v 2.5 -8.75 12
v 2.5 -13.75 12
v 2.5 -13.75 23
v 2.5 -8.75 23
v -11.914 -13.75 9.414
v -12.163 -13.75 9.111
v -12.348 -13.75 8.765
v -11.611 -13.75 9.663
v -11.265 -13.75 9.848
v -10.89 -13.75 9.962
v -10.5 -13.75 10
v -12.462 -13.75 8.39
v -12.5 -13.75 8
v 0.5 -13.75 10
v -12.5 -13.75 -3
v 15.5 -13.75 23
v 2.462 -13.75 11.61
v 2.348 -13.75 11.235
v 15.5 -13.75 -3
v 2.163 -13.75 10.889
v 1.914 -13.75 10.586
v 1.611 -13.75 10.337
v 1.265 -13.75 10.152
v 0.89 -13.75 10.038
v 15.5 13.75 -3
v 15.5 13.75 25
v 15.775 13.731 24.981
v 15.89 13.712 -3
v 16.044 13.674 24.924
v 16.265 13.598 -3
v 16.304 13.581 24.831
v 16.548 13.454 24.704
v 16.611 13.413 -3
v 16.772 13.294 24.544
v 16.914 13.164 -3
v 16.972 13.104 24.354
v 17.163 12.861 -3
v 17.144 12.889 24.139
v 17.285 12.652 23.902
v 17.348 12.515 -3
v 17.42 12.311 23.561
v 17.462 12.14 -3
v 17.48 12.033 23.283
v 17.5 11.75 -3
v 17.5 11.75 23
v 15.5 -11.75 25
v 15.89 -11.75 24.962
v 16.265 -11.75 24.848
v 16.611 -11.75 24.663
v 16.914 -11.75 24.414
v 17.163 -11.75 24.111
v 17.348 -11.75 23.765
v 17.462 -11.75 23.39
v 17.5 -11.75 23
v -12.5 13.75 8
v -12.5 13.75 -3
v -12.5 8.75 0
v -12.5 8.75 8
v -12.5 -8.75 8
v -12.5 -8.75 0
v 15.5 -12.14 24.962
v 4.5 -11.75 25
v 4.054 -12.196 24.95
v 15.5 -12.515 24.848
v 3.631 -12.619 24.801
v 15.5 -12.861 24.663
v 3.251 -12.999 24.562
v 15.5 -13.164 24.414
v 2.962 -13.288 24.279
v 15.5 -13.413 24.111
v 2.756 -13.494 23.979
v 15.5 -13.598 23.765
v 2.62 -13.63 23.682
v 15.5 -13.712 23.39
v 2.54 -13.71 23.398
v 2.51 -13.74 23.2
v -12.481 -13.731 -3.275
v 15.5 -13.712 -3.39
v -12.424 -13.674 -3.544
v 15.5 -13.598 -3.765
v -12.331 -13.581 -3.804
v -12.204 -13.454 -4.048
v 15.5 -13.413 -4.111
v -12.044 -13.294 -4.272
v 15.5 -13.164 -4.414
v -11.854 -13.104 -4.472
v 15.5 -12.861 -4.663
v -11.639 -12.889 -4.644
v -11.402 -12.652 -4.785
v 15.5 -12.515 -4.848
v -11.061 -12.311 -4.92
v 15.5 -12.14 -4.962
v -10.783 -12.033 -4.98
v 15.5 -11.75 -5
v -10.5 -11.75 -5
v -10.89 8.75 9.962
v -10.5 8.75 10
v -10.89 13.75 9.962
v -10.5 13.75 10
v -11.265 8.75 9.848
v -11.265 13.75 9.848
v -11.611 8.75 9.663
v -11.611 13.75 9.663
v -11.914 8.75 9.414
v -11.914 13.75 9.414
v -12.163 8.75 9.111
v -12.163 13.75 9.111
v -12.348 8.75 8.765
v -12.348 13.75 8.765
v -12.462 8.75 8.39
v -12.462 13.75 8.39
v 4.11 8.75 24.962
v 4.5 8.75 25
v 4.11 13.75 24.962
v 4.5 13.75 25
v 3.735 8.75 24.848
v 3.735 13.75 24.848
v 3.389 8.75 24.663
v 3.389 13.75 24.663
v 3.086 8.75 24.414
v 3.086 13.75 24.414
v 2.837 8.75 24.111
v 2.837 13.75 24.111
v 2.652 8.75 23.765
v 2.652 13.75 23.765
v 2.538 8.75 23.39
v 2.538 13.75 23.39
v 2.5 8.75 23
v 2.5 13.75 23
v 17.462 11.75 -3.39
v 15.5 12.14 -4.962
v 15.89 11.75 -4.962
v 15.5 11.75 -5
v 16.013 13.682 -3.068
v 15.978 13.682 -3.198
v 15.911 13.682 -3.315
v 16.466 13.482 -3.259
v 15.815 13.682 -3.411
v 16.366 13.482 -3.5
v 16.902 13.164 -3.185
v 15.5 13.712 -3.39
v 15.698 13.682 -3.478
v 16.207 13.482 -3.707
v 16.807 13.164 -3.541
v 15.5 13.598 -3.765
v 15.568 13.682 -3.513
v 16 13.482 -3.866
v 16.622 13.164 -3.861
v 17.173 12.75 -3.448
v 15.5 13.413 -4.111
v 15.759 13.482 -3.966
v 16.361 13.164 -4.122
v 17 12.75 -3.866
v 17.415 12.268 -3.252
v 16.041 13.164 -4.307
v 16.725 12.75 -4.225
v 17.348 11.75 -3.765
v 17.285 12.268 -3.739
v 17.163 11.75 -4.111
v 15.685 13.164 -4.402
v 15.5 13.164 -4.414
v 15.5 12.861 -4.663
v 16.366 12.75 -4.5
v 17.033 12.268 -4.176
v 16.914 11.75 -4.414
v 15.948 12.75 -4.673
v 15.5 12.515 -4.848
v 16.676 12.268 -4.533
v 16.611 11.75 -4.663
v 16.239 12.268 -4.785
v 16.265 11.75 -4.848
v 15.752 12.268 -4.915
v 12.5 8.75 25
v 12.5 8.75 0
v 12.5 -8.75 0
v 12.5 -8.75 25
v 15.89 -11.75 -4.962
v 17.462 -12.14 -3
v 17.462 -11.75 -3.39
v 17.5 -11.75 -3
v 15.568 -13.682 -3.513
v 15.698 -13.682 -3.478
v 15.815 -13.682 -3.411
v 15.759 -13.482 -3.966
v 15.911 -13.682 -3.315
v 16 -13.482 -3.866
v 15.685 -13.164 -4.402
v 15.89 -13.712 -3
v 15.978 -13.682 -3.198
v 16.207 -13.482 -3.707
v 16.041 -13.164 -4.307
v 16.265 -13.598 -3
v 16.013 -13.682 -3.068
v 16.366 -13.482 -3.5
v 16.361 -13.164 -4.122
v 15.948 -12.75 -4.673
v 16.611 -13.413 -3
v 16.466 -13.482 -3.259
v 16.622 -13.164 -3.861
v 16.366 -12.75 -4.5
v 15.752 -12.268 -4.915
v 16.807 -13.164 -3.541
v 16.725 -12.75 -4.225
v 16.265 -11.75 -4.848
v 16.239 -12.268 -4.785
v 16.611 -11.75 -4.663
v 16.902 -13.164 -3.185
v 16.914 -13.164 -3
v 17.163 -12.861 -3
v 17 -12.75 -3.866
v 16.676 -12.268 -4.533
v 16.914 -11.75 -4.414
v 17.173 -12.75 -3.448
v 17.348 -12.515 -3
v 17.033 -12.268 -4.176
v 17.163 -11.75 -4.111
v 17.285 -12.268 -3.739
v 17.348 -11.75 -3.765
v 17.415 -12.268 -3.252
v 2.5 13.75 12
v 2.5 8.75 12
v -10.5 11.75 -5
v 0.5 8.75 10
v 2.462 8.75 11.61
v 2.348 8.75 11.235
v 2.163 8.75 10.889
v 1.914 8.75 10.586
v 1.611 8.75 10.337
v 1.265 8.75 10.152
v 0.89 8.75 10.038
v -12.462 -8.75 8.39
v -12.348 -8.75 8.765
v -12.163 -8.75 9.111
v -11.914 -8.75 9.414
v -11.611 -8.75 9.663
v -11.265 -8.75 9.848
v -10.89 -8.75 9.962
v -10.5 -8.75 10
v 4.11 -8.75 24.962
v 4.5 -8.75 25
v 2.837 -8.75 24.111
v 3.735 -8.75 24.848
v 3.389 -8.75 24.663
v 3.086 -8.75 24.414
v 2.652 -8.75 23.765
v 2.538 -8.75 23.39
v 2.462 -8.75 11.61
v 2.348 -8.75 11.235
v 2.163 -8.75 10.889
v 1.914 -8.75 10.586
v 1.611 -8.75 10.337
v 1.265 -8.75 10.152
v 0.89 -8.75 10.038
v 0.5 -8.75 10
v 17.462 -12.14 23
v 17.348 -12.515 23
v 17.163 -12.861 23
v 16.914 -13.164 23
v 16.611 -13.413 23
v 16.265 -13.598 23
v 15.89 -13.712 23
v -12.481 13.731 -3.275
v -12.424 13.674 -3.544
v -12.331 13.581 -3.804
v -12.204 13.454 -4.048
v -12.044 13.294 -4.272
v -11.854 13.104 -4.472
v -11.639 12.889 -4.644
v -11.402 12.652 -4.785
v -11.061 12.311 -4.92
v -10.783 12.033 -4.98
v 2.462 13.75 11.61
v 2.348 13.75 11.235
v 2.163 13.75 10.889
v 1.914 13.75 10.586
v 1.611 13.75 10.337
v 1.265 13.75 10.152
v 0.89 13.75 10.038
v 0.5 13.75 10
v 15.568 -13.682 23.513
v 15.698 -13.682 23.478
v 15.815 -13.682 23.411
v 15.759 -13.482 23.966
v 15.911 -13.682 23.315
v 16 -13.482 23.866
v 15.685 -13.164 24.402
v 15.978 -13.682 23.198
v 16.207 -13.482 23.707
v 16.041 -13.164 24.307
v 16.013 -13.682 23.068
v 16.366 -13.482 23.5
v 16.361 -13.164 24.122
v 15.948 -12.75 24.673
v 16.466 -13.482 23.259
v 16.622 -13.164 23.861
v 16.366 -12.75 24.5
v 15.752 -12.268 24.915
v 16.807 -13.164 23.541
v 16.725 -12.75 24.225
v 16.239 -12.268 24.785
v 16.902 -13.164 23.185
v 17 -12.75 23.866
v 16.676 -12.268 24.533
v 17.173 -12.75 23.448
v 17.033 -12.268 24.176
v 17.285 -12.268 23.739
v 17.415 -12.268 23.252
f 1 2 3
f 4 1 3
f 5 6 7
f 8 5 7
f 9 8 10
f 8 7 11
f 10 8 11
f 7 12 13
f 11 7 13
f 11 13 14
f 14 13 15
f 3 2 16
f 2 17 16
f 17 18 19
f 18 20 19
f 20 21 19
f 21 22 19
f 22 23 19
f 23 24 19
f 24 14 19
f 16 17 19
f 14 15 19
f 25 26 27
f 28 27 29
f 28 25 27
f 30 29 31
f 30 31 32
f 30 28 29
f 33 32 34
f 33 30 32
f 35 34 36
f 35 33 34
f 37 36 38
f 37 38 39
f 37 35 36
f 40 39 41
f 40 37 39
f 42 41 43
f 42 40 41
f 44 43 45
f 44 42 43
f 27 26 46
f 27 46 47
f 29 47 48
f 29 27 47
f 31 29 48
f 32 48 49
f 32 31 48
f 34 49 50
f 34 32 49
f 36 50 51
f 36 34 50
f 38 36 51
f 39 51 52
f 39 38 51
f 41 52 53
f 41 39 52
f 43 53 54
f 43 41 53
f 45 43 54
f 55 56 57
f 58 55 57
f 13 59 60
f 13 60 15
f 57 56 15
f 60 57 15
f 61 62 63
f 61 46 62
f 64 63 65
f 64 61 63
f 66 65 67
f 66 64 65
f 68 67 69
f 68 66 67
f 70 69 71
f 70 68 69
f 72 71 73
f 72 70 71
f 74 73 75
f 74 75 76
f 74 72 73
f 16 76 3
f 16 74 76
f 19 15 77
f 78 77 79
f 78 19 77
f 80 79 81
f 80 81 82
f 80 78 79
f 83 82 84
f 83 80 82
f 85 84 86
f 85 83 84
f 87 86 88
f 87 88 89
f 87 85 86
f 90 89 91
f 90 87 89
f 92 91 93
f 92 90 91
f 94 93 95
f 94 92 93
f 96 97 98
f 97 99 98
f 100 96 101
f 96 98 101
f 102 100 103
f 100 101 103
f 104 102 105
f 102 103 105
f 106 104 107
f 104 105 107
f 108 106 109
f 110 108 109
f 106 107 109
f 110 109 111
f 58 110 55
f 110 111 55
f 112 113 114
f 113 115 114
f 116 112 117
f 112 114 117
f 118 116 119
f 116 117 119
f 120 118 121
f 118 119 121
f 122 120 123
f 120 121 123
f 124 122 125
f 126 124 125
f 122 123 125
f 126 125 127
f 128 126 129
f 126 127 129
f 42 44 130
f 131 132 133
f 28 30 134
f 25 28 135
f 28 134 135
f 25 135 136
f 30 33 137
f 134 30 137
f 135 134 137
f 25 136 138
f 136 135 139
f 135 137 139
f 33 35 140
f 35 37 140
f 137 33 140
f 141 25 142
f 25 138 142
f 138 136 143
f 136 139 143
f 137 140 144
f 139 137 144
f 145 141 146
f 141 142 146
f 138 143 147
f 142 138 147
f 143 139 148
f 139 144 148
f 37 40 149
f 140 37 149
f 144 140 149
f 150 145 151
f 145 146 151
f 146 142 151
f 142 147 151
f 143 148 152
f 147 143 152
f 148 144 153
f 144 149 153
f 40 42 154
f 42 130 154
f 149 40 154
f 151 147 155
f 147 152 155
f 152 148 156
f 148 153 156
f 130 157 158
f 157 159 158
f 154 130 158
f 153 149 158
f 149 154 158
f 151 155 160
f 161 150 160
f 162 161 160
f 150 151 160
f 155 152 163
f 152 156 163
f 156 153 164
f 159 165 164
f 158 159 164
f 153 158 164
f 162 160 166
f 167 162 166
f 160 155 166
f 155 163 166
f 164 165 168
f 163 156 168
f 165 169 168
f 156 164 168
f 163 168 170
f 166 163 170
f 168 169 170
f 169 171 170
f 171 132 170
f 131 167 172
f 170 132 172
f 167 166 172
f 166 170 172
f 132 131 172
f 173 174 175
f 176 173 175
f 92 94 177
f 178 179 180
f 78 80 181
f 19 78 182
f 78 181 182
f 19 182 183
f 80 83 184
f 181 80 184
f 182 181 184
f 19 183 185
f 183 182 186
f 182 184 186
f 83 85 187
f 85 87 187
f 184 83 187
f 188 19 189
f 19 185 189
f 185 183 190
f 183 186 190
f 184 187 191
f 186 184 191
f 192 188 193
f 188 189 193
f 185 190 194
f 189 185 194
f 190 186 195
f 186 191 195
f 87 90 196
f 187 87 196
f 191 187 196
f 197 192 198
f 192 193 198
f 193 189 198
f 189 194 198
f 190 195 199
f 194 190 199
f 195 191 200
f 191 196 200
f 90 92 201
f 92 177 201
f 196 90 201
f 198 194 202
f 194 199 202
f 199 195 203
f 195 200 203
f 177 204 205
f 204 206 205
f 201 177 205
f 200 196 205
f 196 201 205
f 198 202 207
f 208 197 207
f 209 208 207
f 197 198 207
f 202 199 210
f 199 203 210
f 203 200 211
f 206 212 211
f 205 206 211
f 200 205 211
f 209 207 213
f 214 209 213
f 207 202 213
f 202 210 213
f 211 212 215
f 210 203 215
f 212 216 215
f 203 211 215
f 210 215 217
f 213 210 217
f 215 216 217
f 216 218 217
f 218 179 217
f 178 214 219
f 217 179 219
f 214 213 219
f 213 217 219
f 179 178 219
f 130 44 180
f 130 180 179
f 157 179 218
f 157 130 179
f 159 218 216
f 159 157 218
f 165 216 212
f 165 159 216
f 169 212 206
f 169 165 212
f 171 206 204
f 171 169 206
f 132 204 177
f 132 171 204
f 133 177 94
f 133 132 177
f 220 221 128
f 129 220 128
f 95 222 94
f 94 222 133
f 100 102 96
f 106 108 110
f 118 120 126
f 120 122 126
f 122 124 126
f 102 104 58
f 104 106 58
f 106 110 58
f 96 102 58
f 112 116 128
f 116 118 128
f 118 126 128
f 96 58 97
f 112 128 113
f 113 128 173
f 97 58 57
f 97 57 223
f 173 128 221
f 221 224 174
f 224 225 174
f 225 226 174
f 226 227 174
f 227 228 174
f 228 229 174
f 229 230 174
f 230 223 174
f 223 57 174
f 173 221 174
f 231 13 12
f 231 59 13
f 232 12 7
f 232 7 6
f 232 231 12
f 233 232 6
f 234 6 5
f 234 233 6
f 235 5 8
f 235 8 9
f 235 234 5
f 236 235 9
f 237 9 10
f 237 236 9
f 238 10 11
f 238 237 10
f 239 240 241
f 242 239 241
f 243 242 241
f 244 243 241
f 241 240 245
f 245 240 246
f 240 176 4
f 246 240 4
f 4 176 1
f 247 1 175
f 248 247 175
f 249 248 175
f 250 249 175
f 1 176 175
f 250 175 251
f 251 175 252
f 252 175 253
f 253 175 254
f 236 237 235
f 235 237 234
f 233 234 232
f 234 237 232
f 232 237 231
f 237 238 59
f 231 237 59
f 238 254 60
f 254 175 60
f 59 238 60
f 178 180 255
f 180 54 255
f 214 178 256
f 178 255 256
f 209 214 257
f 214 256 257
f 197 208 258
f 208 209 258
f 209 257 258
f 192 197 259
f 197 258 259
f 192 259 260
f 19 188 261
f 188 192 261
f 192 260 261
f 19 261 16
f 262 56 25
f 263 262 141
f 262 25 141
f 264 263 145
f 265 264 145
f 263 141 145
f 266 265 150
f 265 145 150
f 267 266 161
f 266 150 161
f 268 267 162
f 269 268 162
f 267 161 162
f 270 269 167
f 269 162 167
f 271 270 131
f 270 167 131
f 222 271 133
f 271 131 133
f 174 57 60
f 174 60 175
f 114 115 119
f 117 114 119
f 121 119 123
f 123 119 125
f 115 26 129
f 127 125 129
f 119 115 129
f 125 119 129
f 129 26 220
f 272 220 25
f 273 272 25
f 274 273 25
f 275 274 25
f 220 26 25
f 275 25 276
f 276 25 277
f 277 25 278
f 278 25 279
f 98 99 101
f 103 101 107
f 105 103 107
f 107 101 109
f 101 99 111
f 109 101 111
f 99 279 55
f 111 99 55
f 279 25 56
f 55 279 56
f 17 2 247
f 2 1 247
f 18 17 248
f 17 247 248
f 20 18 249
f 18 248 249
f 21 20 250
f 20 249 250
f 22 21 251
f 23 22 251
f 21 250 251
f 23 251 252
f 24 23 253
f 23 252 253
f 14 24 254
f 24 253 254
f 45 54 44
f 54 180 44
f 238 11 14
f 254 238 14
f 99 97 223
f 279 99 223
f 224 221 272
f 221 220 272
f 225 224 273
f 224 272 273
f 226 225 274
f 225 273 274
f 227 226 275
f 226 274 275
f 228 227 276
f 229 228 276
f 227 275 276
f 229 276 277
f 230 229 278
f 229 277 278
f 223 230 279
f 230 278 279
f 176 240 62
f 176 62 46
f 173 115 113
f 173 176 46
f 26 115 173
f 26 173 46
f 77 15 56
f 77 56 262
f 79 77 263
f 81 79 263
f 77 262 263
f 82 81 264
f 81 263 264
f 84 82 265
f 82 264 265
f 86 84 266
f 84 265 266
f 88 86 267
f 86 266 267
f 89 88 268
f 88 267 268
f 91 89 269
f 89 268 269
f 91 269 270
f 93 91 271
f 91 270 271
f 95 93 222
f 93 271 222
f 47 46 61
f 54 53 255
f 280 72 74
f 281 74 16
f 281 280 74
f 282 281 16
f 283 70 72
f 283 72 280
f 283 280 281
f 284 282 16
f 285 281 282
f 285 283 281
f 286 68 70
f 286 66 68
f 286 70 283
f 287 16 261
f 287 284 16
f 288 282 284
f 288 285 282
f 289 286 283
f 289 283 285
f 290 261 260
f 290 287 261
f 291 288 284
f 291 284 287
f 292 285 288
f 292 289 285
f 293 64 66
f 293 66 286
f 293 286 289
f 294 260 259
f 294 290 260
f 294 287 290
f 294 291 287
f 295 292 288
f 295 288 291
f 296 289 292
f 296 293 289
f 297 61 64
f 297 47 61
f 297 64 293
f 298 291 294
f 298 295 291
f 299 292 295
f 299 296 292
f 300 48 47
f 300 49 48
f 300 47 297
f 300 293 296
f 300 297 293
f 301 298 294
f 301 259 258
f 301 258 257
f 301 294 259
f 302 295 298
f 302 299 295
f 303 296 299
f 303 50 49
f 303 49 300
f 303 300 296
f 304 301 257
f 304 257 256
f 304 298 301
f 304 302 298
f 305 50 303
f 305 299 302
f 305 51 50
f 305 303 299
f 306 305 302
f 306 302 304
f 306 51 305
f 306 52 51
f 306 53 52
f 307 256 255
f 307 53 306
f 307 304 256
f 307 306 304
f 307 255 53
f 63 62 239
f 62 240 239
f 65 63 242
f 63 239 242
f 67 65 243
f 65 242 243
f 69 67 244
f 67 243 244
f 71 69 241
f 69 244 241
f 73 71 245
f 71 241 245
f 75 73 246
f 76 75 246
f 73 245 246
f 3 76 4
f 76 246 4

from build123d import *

# Parameters (mm, degrees)
SKETCH_W     = 30
SKETCH_H     = 27.5
PAD_DEPTH    = 5
PAD001_DEPTH = 25
SKETCH002_W  = 15
SKETCH002_H  = 15
POCKET_DEPTH = 27.5
FILLET_R     = 2


with BuildPart() as part:
    # Sketch → Pad (new body)
    with BuildSketch(Plane.XY):
        with Locations((2.5, 0)):
            Rectangle(SKETCH_W, SKETCH_H)
    extrude(amount=-PAD_DEPTH)

    # Sketch001 → Pad001 (join)
    with BuildSketch(Plane.XY):
        Polygon((-12.5, 8.75), (12.5, 8.75), (12.5, -8.75), (-12.5, -8.75), (-12.5, -13.75), (17.5, -13.75), (17.5, 13.75), (-12.5, 13.75), align=None)
    extrude(amount=PAD001_DEPTH)

    # Sketch002 (on Face2 of Pad001) → Pocket (cut)
    with BuildSketch(Plane.XZ.offset(13.75)):
        with Locations((-5, 17.5)):
            Rectangle(SKETCH002_W, SKETCH002_H)
    extrude(amount=-POCKET_DEPTH, mode=Mode.SUBTRACT)

    # Fillet
    fillet_edges = [part.edges().sort_by_distance(p)[0] for p in [
        (2.5, 11.25, 25),
        (2.5, 11.25, 10),
        (-12.5, 11.25, 10),
        (2.5, -11.25, 25),
        (2.5, -11.25, 10),
        (-12.5, -11.25, 10),
        (17.5, 0, 25),
        (-12.5, 0, -5),
        (17.5, 0, -5),
        (17.5, 13.75, 10),
        (2.5, 13.75, -5),
        (10, -13.75, 25),
        (2.5, -13.75, -5),
        (17.5, -13.75, 10),
    ]]
    fillet(fillet_edges, radius=FILLET_R)


solid = part.part
